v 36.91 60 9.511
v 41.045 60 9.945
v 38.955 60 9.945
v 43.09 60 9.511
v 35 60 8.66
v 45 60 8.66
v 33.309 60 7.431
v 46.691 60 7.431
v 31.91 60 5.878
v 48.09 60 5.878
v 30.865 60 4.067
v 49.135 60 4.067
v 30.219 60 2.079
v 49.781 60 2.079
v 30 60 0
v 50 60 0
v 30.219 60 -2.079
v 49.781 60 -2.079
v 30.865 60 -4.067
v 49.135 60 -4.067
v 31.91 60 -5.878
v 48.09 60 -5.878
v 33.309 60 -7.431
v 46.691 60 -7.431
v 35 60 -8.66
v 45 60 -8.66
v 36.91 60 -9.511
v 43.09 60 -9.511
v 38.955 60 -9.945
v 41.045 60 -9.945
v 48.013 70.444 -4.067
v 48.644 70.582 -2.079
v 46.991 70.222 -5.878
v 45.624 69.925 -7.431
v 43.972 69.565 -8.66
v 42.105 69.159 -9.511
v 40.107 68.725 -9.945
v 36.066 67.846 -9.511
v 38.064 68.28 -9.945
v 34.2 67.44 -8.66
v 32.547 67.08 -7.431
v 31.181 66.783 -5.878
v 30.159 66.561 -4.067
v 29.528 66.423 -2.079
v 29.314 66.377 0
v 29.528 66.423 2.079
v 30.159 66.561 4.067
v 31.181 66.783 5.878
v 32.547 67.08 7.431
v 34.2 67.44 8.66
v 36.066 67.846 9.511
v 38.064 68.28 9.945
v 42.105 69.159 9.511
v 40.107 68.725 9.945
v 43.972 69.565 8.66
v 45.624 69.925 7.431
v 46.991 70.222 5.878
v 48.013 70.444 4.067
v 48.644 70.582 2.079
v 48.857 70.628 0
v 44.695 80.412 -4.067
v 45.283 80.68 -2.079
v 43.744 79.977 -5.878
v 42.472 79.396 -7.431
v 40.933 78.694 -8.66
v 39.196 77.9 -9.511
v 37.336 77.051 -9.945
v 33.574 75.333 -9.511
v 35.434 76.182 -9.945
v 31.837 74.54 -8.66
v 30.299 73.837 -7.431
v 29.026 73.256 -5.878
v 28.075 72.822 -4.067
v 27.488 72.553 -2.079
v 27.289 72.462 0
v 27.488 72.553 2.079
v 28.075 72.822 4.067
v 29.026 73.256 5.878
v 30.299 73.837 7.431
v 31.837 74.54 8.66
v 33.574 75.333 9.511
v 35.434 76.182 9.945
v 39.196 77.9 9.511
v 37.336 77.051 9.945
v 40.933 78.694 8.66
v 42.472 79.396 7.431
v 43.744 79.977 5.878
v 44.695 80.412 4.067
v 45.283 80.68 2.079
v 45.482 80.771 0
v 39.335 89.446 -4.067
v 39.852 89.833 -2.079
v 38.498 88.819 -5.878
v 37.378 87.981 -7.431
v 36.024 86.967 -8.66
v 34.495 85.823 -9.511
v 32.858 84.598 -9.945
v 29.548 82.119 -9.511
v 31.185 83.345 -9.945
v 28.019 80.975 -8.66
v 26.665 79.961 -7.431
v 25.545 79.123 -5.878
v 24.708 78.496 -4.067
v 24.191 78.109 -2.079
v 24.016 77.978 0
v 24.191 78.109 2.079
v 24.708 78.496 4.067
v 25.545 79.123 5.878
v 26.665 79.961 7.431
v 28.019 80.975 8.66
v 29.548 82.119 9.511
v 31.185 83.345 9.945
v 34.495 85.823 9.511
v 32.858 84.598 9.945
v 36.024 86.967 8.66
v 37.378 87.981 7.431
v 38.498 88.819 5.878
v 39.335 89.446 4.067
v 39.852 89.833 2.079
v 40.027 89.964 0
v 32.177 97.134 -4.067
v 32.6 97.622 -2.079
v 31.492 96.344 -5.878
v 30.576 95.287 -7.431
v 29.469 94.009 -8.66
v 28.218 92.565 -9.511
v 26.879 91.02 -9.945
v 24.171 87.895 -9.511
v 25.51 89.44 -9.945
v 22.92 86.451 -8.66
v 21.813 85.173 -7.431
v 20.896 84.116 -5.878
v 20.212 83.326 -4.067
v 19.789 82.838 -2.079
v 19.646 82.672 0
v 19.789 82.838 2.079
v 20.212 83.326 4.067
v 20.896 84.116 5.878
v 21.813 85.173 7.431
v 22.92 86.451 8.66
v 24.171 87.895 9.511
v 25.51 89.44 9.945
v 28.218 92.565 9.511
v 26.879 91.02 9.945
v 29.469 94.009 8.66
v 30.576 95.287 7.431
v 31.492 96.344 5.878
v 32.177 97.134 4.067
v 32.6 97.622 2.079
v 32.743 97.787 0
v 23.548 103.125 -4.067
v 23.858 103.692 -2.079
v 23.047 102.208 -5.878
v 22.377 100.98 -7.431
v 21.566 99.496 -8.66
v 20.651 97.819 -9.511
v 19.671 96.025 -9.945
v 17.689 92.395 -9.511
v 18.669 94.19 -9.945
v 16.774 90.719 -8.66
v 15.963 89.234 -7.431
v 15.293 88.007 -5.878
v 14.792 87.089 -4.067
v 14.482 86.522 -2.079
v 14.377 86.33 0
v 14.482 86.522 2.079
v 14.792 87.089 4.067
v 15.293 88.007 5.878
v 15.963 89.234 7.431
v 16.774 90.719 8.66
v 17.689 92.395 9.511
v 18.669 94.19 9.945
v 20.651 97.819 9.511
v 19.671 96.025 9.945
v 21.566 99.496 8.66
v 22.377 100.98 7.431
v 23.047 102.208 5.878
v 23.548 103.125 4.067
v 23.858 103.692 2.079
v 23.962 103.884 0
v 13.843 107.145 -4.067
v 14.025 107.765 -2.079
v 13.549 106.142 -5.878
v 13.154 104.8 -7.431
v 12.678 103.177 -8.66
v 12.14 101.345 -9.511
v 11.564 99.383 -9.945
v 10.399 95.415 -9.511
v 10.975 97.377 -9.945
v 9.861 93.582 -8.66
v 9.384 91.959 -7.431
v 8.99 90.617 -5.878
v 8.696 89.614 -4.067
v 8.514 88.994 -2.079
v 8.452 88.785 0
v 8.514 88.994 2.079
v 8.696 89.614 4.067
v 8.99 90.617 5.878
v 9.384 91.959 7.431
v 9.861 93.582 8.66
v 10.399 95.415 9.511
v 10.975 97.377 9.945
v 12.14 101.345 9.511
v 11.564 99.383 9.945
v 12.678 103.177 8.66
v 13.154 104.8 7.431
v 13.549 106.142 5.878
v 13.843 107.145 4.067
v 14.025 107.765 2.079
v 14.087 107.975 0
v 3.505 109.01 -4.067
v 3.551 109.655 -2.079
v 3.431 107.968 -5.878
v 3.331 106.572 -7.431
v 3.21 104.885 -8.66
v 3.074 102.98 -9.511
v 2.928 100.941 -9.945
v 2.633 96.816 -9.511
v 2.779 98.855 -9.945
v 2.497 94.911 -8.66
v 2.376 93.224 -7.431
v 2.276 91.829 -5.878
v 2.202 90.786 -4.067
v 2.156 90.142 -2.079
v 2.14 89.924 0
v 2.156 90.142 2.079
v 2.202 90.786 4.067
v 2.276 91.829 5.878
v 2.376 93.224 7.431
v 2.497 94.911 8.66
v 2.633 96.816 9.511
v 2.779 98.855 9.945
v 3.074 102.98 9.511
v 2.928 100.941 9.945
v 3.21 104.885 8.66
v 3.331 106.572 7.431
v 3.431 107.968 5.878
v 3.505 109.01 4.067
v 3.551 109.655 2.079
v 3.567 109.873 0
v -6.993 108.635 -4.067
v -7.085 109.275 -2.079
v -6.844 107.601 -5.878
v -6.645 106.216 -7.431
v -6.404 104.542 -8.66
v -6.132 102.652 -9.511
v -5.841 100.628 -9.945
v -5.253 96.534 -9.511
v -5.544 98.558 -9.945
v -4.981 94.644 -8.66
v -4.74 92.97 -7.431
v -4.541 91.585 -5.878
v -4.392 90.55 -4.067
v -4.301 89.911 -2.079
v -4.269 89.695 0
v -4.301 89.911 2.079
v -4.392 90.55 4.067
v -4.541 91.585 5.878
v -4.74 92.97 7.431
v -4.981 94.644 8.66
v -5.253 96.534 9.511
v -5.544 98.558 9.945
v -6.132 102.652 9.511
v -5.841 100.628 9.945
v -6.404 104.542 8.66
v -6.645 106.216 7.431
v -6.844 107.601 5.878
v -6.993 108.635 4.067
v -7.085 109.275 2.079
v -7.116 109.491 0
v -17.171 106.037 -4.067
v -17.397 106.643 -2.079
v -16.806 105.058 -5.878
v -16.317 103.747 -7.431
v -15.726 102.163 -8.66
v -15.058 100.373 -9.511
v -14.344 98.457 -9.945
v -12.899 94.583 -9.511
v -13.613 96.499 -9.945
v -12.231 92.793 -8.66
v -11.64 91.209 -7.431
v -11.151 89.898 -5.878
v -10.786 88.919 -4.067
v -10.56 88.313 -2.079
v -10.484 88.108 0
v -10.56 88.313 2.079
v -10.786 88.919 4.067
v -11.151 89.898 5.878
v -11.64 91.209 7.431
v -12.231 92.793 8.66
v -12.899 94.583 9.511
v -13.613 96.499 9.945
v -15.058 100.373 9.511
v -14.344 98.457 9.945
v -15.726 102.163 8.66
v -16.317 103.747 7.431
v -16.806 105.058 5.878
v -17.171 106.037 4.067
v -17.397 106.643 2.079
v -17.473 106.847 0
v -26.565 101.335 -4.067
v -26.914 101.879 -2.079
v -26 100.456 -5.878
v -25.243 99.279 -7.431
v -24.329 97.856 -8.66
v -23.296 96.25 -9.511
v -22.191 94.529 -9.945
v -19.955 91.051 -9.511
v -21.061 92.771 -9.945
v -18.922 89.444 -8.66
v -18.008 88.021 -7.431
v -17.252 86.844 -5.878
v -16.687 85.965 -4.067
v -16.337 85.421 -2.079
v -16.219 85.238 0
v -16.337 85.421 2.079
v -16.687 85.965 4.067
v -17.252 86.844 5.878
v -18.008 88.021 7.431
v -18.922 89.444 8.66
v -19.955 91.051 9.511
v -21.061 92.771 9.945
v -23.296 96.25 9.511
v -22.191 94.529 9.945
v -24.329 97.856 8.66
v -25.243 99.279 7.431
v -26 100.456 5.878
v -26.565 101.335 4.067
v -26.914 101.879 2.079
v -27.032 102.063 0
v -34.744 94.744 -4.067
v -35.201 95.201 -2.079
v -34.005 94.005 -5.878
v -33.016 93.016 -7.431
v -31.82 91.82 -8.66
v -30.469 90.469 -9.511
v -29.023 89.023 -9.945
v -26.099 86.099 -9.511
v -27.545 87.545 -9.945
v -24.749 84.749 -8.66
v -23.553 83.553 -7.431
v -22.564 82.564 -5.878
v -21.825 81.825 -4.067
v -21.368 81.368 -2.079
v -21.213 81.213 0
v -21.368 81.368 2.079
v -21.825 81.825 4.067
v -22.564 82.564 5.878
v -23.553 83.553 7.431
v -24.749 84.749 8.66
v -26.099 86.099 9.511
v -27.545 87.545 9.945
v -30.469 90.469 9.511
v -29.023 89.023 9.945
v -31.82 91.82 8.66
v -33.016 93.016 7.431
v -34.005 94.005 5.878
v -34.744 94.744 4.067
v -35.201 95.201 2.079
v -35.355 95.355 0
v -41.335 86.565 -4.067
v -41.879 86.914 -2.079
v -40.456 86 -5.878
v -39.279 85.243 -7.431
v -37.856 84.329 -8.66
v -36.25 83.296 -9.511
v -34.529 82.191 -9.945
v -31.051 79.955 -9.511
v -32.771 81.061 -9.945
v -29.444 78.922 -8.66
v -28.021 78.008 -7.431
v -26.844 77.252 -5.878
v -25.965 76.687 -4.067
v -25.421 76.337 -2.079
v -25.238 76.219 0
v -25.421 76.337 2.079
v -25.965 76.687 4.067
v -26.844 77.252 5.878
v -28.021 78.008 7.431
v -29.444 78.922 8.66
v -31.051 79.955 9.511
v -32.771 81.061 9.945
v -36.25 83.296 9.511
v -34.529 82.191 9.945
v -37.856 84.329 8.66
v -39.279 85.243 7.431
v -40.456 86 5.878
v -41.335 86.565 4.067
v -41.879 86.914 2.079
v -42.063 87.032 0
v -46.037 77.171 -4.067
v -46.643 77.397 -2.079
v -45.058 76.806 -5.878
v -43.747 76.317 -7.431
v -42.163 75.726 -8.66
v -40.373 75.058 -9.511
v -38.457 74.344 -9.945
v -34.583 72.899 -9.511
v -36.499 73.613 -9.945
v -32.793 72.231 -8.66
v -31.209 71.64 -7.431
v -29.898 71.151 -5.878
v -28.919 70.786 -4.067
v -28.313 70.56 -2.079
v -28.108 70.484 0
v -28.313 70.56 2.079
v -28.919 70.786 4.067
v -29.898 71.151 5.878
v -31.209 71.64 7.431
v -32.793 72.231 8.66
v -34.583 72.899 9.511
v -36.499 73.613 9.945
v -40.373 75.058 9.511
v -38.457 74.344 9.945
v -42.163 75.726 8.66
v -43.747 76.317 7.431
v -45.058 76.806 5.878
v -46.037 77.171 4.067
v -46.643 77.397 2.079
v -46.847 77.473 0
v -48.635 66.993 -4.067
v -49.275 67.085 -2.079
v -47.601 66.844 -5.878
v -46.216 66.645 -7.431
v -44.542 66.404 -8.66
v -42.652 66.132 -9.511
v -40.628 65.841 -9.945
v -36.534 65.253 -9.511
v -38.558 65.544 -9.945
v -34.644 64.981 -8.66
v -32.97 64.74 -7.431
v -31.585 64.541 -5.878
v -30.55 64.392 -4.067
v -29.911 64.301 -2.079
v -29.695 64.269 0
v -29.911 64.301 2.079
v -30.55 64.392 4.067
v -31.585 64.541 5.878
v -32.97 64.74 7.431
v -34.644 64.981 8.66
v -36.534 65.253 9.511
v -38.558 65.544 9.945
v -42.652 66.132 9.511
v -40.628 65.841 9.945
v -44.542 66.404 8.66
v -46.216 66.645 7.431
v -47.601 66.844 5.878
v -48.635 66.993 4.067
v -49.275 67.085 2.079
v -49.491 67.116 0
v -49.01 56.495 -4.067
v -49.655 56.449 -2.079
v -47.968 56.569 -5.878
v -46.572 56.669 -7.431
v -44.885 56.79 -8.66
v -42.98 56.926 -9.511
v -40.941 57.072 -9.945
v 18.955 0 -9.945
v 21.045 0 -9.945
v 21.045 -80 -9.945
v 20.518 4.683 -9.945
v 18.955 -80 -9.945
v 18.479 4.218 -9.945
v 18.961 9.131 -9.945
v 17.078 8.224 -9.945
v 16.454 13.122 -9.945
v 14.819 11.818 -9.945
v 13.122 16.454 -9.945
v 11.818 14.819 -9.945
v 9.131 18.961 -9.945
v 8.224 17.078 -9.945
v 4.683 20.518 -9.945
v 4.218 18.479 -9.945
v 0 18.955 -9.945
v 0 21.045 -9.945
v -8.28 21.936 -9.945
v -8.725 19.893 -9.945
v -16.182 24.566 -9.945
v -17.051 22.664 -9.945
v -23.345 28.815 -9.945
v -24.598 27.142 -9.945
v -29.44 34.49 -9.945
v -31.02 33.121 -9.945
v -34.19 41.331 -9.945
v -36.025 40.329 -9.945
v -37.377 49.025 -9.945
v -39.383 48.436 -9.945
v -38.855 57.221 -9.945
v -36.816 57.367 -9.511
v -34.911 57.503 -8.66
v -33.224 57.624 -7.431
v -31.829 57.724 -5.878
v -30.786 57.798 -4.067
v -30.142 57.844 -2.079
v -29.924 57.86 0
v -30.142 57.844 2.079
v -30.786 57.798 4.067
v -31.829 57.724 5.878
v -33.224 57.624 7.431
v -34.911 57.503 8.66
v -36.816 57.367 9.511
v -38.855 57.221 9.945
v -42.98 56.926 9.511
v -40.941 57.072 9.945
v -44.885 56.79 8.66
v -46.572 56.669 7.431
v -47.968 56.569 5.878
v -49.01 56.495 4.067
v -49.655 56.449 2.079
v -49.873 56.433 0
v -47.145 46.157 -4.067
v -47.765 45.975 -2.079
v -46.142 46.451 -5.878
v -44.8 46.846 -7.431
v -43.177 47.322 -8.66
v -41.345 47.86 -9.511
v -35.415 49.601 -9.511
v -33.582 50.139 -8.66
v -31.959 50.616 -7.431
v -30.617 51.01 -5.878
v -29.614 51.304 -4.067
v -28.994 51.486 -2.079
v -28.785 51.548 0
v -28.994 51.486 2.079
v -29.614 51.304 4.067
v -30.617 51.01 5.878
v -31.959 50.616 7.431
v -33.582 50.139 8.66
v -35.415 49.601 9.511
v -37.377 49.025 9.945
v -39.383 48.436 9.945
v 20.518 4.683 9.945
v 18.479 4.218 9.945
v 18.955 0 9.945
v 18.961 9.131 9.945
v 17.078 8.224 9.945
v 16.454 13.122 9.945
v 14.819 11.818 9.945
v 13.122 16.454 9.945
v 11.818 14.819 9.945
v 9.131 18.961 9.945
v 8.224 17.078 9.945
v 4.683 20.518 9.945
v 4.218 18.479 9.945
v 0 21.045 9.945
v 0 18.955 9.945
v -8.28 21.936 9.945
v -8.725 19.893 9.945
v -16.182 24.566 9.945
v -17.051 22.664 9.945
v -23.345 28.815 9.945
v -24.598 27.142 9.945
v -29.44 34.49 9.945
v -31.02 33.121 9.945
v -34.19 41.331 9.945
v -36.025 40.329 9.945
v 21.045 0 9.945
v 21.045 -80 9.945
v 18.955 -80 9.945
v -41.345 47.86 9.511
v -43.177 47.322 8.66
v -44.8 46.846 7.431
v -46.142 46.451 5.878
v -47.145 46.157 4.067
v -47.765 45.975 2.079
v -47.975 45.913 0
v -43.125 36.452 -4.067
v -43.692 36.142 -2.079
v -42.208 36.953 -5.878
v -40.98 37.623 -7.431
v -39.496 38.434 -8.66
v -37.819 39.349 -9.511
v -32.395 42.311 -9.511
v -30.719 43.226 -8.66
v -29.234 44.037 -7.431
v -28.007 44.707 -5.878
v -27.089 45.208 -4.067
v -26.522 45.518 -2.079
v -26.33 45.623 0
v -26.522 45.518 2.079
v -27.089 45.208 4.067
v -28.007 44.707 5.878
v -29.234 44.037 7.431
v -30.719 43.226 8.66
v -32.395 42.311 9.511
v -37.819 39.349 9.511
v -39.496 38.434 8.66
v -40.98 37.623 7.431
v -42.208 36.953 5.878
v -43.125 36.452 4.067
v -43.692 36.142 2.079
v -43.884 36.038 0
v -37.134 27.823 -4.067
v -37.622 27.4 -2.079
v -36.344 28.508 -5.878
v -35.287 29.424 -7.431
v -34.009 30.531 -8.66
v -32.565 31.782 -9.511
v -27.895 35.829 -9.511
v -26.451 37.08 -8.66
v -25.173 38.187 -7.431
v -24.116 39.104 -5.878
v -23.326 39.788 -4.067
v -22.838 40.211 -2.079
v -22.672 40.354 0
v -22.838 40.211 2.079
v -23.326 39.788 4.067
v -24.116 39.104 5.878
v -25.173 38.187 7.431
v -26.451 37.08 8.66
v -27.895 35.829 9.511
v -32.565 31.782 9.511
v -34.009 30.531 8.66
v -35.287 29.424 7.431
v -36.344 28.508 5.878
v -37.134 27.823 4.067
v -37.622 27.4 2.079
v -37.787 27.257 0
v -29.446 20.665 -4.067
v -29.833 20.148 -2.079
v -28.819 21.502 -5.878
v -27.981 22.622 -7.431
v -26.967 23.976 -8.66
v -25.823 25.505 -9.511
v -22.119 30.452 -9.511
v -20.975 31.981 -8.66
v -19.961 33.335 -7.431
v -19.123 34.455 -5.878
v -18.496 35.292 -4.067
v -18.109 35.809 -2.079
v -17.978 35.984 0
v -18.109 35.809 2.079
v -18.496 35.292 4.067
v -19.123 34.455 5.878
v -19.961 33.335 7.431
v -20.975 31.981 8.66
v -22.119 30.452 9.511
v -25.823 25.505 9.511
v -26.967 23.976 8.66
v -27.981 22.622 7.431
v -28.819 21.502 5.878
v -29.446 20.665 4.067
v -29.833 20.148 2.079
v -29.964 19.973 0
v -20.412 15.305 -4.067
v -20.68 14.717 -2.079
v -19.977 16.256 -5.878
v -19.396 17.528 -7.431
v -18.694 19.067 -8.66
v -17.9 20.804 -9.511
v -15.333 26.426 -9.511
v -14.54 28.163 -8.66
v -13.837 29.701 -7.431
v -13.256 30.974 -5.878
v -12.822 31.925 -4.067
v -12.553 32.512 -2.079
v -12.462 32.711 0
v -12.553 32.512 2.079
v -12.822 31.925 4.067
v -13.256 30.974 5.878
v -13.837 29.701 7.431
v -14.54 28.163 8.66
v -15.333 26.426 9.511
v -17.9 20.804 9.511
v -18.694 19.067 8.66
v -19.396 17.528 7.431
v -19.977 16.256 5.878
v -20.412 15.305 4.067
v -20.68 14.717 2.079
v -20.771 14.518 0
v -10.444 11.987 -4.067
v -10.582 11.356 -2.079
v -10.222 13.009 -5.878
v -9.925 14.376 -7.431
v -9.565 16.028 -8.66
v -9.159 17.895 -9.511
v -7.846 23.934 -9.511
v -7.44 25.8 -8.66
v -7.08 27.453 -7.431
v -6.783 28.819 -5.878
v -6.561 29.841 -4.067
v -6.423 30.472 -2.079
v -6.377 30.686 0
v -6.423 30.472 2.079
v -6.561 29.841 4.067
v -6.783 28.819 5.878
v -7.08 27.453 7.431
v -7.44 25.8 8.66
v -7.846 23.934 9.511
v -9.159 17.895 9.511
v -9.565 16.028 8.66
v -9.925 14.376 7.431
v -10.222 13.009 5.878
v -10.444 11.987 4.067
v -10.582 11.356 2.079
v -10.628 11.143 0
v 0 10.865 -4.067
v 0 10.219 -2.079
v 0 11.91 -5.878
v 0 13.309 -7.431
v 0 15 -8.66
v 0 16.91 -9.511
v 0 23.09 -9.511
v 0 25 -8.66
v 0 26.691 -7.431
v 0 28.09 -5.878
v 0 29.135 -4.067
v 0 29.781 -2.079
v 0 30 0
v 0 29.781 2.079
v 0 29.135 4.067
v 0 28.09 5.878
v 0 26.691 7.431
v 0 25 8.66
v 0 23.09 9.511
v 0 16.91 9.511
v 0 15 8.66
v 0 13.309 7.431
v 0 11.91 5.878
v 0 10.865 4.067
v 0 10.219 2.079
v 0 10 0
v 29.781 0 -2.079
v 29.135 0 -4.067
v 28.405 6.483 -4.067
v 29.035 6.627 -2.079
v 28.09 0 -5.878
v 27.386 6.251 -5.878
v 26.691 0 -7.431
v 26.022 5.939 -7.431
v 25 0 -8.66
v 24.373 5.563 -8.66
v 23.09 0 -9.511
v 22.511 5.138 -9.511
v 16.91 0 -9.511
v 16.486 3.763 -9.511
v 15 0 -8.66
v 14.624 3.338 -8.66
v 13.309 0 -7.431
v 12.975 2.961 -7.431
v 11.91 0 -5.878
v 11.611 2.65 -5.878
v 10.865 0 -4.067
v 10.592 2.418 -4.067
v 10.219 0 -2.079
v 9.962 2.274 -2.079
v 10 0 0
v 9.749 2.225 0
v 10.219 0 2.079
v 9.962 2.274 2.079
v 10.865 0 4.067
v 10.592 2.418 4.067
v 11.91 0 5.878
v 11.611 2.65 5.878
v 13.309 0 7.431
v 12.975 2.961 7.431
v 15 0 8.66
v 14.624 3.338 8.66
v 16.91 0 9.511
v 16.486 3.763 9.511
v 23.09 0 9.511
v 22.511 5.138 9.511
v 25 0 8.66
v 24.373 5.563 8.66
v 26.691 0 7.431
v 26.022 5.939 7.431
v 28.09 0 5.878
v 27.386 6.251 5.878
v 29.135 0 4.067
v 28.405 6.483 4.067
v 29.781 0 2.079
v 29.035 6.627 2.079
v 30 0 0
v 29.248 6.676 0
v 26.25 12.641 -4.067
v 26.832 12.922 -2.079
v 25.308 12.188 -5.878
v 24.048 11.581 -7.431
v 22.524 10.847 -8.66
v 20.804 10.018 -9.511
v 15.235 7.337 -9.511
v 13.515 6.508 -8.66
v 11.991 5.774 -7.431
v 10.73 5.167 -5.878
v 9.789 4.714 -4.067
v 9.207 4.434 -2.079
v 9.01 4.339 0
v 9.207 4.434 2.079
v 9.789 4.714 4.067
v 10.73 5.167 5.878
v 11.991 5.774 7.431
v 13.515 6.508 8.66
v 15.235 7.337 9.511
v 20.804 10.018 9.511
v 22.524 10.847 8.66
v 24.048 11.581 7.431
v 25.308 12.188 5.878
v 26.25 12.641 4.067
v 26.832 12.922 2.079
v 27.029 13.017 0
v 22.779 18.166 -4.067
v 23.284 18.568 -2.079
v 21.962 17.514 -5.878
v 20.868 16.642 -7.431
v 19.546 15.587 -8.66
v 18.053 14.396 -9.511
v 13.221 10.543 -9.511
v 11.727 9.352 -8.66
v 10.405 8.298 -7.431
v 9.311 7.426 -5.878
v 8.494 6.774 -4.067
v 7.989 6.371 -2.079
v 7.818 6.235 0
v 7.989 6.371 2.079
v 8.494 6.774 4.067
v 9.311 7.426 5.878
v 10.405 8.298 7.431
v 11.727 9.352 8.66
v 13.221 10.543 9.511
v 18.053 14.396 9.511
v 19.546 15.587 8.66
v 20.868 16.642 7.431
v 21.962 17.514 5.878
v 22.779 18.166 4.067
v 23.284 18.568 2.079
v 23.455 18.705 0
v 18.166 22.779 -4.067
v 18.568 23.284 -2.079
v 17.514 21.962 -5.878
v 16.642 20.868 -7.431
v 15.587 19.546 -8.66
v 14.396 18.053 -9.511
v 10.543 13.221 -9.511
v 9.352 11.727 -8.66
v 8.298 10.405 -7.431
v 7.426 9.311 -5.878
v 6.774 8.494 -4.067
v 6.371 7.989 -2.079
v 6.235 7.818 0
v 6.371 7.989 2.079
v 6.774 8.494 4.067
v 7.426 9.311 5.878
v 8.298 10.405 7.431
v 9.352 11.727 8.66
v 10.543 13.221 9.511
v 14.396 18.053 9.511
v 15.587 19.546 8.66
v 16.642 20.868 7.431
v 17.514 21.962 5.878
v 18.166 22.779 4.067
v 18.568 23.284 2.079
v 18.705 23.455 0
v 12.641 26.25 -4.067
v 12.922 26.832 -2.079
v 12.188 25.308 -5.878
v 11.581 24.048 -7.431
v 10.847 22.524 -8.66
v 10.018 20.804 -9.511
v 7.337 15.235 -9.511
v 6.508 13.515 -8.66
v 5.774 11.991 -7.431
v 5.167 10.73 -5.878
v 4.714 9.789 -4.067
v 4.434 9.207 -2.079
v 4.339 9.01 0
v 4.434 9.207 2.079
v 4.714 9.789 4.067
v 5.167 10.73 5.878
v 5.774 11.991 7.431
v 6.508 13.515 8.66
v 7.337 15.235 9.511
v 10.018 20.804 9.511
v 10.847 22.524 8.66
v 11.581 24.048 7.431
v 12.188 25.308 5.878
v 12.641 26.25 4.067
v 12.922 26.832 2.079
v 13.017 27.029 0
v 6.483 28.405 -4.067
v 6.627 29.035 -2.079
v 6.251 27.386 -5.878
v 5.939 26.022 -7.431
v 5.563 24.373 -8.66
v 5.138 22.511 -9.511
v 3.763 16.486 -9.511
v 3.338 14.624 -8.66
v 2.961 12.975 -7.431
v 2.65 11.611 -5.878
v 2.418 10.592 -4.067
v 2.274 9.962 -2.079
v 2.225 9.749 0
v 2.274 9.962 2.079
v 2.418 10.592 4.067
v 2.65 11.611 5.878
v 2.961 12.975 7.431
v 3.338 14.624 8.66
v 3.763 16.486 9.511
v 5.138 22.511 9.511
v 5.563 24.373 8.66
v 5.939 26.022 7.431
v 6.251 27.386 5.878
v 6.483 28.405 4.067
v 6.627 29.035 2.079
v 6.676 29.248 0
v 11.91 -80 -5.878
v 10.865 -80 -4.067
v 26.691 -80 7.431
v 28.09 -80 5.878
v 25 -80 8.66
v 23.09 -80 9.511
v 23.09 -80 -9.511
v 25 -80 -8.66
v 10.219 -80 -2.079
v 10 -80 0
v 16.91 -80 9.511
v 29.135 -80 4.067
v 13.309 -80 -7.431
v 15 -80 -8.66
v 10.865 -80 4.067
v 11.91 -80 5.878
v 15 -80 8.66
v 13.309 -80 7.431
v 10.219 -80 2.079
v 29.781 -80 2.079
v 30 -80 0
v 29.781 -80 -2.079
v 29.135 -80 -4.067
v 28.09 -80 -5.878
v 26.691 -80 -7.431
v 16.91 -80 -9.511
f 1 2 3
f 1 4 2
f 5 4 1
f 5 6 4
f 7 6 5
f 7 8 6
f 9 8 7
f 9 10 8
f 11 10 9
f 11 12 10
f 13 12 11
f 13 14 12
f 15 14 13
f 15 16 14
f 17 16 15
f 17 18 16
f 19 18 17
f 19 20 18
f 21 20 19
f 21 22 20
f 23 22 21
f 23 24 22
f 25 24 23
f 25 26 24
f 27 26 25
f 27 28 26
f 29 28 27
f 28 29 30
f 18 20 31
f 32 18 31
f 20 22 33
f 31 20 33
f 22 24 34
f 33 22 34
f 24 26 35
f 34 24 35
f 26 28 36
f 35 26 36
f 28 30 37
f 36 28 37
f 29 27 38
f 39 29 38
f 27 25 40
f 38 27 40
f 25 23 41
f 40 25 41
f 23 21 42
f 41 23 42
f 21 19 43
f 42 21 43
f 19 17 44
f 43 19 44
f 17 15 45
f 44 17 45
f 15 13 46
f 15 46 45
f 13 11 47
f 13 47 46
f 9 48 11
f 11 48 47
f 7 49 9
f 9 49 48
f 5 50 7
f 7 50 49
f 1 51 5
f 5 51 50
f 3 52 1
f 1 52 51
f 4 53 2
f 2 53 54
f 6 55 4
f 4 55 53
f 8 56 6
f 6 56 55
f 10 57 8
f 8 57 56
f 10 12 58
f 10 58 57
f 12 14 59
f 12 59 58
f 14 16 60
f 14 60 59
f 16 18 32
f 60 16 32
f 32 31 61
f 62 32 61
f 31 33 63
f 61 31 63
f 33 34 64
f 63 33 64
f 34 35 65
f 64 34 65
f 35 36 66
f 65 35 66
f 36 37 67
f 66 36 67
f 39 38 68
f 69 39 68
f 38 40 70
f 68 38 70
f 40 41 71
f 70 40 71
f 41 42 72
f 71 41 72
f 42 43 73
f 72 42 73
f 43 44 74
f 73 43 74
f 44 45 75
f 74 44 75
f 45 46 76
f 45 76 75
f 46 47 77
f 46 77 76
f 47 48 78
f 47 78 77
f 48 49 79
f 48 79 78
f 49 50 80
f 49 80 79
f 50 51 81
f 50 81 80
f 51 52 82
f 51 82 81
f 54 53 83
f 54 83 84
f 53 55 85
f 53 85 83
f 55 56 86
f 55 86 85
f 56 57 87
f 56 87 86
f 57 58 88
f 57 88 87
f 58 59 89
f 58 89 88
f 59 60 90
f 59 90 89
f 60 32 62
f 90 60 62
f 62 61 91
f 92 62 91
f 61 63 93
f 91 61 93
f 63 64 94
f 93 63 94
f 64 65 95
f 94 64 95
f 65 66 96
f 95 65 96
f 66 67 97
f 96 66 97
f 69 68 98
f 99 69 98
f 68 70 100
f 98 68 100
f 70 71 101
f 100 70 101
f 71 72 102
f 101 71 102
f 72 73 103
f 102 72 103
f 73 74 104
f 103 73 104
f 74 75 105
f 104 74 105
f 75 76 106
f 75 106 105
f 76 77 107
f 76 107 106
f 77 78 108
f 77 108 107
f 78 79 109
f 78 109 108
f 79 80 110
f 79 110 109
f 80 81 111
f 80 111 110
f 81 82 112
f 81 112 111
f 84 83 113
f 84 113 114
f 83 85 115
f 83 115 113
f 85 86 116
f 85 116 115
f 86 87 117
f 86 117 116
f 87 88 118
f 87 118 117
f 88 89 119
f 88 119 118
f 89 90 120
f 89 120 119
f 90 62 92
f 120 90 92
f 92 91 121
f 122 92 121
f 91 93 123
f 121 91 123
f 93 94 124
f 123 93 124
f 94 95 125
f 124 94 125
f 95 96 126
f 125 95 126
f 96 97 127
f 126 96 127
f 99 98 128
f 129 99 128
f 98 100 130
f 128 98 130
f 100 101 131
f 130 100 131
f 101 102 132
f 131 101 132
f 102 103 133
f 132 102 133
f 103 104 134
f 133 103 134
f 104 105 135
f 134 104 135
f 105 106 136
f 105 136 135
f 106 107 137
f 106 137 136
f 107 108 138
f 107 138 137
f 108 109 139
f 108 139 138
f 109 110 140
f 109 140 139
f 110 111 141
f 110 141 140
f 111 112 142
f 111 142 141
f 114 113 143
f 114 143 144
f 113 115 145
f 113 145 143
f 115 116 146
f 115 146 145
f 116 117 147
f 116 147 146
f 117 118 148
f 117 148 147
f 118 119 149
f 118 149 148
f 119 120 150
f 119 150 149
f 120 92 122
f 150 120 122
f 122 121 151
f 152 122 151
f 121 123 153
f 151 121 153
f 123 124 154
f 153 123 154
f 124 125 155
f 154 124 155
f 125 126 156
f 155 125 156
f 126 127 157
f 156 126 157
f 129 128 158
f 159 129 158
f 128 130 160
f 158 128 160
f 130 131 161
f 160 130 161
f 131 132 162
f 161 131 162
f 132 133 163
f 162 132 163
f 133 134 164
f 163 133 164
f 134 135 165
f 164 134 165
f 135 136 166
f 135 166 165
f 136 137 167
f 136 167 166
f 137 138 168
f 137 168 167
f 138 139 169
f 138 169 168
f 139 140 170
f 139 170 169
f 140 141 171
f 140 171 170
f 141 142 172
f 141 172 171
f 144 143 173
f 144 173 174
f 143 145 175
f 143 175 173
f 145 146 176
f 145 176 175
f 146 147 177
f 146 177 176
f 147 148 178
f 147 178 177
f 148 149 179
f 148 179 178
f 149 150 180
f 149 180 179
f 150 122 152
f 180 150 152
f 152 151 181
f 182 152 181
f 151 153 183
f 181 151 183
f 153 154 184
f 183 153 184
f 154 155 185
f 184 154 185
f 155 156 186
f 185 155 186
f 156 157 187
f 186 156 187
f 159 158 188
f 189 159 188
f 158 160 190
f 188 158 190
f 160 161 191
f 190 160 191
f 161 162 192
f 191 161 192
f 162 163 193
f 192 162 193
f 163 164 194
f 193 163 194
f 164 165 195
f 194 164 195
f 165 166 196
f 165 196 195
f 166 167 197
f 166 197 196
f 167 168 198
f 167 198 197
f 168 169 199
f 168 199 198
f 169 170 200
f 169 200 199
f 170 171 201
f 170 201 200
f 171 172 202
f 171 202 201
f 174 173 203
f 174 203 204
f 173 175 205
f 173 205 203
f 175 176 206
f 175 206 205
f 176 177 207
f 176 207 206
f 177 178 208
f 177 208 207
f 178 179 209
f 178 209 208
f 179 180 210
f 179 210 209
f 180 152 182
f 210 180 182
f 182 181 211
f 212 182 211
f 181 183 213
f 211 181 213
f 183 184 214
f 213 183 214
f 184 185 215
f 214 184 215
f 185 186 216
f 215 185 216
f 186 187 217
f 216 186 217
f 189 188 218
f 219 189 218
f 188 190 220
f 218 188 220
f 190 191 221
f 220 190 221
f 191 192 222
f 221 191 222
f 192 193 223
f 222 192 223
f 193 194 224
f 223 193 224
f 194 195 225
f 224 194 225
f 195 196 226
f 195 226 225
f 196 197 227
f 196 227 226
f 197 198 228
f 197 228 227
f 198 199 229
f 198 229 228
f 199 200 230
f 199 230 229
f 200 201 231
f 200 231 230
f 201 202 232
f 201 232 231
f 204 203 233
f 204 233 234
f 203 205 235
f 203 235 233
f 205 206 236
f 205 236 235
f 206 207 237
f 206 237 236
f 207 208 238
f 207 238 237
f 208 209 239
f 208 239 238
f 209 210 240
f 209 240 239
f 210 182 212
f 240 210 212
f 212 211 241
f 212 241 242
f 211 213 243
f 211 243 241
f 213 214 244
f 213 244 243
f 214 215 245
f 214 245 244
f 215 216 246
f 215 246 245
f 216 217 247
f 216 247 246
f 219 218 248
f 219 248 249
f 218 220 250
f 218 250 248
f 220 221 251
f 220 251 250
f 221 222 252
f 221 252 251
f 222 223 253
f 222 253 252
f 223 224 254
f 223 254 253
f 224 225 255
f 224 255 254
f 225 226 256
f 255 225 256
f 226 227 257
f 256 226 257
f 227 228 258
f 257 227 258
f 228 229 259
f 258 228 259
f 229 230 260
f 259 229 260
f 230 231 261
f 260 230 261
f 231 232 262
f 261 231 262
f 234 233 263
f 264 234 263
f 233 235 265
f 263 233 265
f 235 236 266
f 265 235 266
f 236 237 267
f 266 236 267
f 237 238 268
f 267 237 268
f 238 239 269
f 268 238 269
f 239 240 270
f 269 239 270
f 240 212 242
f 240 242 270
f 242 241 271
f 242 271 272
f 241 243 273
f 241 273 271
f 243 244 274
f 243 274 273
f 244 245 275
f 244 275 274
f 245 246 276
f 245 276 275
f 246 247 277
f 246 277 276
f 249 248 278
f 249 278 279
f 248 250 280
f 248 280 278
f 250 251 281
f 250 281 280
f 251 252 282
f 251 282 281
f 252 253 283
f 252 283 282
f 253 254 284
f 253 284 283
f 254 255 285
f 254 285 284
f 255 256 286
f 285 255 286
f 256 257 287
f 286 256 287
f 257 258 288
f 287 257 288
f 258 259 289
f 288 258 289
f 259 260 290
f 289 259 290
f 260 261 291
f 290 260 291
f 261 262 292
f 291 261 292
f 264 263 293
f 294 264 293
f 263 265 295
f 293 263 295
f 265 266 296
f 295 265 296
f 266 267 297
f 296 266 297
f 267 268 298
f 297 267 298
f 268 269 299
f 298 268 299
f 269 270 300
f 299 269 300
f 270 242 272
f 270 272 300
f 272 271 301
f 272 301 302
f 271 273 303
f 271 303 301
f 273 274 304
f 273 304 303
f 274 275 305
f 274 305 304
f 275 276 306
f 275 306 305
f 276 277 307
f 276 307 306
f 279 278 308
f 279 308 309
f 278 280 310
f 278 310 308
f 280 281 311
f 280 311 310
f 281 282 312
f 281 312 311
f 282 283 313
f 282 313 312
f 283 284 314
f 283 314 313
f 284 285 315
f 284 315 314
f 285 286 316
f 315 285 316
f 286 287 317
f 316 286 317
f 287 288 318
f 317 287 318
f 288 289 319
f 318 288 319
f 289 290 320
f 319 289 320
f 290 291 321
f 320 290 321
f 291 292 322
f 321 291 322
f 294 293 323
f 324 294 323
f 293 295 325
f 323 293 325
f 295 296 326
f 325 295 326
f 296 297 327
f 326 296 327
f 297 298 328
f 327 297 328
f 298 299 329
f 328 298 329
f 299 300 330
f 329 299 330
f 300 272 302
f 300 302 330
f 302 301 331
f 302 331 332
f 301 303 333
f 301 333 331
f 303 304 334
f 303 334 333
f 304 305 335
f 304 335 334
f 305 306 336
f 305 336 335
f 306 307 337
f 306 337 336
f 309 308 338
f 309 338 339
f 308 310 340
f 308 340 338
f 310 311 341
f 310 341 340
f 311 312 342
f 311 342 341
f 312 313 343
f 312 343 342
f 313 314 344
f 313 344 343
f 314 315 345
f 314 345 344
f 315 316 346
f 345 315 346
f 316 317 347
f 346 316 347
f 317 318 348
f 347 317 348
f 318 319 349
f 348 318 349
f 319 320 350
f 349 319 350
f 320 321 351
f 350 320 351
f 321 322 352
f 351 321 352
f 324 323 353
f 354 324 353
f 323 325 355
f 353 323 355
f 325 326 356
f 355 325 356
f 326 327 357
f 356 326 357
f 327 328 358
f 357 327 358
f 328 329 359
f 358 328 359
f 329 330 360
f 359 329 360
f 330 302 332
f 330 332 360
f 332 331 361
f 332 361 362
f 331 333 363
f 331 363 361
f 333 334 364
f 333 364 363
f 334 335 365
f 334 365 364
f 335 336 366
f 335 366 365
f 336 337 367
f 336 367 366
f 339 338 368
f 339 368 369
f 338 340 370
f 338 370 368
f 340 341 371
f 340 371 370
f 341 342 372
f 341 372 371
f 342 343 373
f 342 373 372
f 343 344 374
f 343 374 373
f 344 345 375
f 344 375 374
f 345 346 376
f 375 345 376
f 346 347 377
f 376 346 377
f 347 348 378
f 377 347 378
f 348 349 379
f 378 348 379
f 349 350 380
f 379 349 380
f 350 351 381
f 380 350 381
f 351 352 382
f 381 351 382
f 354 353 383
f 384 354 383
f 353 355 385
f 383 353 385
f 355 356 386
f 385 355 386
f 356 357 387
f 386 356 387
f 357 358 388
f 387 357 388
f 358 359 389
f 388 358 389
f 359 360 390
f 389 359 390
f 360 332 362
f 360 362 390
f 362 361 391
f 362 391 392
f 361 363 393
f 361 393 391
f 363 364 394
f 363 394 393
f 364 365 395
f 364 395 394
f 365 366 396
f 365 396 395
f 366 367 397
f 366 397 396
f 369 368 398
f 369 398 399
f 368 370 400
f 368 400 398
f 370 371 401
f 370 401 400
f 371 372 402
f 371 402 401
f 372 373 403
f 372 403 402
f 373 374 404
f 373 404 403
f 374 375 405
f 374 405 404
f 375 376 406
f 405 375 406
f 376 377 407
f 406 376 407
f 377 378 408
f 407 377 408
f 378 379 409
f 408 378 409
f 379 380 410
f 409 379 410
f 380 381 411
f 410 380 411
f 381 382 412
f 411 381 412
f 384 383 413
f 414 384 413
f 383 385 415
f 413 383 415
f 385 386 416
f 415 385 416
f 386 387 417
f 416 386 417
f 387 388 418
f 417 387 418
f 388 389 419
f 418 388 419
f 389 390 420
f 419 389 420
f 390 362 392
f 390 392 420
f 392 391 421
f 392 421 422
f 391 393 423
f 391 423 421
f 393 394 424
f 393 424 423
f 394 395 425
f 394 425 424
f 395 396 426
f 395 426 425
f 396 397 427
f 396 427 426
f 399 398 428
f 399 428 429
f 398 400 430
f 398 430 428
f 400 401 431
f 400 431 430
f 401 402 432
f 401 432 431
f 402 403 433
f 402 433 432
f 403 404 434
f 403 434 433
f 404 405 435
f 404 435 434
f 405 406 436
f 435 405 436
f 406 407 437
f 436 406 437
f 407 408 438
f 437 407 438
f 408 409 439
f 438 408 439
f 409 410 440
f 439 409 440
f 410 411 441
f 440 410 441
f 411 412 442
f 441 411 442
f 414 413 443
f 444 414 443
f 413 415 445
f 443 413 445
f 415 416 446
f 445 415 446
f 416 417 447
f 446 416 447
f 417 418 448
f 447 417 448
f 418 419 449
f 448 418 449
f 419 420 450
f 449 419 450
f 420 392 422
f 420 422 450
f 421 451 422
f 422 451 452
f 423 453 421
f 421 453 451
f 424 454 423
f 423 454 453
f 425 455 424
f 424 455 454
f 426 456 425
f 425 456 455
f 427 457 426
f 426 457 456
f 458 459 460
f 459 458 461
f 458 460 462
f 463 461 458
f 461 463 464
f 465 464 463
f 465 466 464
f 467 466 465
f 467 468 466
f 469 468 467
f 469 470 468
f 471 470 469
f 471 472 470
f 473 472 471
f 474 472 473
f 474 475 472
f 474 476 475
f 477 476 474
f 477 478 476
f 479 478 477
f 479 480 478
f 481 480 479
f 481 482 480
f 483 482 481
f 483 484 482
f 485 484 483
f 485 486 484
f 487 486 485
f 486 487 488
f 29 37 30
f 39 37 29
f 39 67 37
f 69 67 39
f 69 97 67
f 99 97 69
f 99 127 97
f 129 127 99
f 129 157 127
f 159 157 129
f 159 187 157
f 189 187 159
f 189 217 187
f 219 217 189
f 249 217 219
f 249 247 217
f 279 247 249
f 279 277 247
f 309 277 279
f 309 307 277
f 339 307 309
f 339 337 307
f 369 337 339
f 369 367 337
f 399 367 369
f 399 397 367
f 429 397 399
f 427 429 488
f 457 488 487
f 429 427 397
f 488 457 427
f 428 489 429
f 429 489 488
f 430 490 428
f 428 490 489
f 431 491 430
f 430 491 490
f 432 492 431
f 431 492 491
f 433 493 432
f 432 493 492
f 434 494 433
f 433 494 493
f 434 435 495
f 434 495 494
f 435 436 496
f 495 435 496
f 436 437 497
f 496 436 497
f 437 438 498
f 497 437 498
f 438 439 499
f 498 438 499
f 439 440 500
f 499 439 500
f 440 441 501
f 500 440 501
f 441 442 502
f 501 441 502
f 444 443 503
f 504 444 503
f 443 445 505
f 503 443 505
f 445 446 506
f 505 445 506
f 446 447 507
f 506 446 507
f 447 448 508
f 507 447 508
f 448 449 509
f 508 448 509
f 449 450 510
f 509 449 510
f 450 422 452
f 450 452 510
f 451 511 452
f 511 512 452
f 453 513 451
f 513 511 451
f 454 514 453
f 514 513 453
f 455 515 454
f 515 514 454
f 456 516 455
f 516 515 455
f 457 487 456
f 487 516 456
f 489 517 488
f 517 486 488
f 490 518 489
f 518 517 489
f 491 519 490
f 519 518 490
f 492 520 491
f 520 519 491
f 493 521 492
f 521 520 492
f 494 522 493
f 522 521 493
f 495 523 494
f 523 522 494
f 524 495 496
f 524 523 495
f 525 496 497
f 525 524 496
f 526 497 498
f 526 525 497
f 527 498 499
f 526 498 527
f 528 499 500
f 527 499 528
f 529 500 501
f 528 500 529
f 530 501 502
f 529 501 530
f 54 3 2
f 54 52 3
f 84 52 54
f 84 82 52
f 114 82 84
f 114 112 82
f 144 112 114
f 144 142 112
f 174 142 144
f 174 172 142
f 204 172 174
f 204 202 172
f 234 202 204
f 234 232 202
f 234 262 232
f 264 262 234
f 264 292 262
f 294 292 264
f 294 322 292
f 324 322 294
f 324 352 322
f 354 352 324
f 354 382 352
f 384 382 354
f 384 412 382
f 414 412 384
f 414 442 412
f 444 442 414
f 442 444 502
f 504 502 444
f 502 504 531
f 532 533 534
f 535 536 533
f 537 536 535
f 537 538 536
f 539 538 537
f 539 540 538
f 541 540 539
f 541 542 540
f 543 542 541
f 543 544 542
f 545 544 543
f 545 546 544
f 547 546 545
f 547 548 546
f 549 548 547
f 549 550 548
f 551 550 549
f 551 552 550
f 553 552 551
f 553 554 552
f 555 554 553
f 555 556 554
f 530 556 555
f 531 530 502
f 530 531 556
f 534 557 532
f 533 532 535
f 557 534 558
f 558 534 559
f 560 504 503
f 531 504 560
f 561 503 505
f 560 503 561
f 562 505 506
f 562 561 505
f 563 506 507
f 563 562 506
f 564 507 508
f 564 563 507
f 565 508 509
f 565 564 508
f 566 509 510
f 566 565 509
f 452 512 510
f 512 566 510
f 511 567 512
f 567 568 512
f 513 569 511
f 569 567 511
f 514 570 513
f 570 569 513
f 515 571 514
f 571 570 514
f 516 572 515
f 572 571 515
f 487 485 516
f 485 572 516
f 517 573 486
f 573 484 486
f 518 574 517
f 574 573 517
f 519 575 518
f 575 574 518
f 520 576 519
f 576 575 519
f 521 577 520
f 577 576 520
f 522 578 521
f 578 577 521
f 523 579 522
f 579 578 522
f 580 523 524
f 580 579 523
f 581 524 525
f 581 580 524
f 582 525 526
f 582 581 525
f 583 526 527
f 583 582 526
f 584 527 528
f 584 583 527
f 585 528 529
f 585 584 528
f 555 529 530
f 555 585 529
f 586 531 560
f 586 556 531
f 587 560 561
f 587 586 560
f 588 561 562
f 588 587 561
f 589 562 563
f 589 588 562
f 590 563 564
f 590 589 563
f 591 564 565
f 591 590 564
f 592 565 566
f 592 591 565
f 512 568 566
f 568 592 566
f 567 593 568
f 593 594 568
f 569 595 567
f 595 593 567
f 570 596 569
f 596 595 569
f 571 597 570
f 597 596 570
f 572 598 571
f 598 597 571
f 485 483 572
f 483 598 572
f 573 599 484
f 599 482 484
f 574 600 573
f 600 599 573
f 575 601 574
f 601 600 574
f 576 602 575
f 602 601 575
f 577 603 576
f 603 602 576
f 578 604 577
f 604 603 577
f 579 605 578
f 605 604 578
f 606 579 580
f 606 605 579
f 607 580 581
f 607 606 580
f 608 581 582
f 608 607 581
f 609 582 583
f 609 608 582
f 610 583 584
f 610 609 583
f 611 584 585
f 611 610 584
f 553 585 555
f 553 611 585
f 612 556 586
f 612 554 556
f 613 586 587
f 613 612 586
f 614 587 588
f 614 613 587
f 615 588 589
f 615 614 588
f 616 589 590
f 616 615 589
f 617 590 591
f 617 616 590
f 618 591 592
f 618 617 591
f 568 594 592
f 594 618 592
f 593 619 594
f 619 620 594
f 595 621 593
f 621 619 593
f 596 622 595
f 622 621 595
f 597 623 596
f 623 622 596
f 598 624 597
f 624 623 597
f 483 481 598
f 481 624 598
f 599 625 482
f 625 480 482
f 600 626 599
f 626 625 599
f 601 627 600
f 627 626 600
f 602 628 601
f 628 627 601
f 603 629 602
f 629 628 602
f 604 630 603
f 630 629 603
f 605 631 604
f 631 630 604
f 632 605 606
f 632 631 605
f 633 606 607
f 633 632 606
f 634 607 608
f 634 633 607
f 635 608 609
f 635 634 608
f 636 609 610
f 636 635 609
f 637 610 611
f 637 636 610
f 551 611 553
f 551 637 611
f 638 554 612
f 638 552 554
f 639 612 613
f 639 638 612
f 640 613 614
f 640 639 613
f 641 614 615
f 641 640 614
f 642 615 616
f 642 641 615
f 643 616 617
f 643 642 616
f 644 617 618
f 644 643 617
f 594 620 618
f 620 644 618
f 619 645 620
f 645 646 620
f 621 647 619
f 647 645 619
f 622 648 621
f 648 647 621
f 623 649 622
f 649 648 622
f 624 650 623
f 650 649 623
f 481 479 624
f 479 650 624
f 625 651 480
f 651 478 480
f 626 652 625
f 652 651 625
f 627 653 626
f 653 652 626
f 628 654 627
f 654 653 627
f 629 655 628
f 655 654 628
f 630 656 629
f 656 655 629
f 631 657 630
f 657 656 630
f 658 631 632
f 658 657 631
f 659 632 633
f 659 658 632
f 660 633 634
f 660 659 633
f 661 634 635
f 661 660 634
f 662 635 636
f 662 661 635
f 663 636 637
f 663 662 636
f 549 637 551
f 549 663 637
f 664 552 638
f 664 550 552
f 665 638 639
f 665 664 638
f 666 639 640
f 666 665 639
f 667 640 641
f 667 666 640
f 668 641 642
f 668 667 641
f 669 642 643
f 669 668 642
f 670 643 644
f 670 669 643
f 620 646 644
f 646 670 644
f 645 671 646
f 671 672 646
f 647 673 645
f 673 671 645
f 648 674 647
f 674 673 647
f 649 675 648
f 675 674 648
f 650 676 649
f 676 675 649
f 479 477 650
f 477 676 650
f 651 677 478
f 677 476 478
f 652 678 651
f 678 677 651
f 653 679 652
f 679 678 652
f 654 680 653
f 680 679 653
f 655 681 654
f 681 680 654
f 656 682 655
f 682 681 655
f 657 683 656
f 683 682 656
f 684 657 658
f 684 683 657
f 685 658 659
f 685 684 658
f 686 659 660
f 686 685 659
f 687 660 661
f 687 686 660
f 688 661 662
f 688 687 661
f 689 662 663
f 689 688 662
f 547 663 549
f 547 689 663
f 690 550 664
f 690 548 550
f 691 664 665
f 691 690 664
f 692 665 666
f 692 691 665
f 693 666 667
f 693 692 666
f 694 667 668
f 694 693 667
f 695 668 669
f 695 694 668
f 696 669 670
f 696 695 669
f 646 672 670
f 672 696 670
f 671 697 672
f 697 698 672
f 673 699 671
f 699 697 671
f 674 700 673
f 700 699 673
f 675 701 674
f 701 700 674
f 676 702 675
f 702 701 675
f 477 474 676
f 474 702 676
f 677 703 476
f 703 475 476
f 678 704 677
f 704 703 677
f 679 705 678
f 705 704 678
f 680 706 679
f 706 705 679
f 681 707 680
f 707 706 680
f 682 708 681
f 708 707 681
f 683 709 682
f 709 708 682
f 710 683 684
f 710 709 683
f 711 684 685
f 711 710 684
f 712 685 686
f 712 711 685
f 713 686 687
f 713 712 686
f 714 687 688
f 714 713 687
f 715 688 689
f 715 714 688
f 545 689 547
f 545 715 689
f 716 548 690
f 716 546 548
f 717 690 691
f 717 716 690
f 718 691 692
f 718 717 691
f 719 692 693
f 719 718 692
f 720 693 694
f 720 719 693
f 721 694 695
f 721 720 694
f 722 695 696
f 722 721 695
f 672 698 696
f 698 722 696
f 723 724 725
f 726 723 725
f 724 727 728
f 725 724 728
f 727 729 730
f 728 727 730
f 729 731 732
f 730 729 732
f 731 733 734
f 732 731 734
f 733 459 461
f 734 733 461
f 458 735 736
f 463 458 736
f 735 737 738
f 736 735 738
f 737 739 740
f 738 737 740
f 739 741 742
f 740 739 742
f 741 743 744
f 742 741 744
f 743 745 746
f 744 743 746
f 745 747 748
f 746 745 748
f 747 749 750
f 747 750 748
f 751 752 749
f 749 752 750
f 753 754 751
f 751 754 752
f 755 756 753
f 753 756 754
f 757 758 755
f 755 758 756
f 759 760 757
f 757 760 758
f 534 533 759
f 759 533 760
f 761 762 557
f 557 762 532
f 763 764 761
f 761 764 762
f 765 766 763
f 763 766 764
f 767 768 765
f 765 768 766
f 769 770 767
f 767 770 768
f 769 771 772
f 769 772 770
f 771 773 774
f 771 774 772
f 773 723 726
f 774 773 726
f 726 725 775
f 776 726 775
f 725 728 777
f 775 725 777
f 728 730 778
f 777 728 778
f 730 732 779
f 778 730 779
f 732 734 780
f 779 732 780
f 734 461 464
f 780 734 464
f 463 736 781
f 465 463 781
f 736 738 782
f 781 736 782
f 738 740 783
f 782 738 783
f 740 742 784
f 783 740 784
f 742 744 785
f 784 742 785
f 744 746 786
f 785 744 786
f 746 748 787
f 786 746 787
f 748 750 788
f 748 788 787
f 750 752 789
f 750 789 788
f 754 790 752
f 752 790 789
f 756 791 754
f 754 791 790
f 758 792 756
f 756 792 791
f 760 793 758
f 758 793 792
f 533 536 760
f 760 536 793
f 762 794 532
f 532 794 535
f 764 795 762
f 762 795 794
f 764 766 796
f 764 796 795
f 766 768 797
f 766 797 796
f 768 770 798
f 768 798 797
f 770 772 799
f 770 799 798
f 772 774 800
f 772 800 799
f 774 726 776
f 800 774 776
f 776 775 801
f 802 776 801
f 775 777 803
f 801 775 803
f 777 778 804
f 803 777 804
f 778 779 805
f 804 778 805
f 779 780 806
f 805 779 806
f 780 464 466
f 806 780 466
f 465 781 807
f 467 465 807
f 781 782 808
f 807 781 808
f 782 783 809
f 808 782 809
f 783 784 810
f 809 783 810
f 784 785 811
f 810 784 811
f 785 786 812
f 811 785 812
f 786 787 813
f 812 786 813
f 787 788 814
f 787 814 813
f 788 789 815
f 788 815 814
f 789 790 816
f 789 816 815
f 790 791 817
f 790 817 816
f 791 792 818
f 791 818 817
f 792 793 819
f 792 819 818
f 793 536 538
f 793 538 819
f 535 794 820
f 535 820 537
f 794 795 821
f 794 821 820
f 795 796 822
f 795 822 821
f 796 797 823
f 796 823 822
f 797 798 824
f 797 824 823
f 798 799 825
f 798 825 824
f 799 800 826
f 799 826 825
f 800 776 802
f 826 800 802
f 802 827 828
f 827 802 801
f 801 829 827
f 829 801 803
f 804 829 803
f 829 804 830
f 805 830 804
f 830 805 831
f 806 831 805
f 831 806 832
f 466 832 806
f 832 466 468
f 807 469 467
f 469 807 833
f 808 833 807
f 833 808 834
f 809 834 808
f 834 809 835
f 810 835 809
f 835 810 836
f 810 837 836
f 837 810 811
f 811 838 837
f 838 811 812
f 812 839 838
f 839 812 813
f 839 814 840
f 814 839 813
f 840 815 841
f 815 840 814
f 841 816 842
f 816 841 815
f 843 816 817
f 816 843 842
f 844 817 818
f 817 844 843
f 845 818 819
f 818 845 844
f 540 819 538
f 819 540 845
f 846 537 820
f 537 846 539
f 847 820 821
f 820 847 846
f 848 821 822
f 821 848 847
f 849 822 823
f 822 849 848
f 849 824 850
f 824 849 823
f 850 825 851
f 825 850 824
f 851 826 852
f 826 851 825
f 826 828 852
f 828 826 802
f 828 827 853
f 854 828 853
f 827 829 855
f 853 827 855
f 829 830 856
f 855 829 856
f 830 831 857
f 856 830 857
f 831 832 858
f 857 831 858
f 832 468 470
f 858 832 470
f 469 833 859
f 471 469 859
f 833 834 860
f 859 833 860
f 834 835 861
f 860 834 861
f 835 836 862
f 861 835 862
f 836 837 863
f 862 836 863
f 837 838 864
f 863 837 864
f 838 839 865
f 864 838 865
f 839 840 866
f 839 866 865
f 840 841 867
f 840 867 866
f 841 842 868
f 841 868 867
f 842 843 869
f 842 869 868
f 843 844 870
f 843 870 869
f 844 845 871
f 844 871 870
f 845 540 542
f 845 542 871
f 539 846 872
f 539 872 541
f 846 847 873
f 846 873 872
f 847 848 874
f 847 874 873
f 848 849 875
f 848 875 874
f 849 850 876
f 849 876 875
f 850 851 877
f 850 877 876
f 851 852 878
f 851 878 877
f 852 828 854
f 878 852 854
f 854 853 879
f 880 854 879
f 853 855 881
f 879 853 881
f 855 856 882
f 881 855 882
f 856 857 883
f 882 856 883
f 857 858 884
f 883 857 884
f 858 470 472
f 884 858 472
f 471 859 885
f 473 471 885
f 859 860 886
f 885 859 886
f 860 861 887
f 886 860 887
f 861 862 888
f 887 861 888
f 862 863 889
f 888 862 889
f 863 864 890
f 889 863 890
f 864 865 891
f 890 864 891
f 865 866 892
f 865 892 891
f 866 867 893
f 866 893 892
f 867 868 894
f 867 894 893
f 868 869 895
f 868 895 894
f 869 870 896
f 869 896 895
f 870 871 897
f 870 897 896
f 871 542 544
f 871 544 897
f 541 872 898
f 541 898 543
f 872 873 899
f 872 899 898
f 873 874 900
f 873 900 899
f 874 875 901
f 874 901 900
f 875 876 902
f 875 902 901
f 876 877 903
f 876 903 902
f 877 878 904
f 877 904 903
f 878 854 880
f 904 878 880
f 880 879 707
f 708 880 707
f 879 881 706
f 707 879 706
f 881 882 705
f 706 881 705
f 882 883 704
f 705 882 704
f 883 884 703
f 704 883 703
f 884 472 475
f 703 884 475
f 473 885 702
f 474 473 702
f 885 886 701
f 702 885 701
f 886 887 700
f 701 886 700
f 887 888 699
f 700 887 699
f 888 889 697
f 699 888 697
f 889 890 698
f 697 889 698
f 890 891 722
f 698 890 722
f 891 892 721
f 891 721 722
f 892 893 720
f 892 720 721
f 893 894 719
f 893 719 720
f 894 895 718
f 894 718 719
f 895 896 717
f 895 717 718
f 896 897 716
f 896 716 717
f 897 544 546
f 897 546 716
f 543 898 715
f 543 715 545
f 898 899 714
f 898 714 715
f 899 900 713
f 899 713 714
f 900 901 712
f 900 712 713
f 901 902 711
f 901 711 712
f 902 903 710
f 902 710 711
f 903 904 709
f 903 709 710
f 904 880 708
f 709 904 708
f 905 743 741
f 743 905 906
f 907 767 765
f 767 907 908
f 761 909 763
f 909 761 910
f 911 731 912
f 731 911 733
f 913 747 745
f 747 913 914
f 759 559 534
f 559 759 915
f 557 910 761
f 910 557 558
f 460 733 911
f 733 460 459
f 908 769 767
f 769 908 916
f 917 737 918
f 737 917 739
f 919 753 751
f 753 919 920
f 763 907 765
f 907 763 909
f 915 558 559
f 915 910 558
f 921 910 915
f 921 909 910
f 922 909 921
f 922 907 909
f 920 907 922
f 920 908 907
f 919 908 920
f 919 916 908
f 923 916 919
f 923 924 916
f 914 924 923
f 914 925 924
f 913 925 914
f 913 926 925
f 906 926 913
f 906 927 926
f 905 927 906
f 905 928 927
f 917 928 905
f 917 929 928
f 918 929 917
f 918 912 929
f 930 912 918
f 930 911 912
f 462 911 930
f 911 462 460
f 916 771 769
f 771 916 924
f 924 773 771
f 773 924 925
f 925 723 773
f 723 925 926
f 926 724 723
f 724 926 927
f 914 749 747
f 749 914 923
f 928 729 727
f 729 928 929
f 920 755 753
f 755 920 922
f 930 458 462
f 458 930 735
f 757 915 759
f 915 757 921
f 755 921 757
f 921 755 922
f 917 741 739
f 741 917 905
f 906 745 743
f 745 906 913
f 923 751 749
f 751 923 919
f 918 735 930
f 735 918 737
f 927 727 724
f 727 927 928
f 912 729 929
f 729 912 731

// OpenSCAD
//
// A Hook
//
color("lime") {
	translate([0,60,0]) {
		 rotate_extrude(angle=270, convexity=10) {
				 translate([40, 0]) {
					 circle(10);
				 }
		 }
	}
	rotate_extrude(angle=90, convexity=10) {
		 translate([20, 0]) {
			 circle(10);
		 }
	}
	translate([20,0,0]) {
		 rotate([90,0,0]) {
			 cylinder(r=10,h=80);
		 }
	}
}
